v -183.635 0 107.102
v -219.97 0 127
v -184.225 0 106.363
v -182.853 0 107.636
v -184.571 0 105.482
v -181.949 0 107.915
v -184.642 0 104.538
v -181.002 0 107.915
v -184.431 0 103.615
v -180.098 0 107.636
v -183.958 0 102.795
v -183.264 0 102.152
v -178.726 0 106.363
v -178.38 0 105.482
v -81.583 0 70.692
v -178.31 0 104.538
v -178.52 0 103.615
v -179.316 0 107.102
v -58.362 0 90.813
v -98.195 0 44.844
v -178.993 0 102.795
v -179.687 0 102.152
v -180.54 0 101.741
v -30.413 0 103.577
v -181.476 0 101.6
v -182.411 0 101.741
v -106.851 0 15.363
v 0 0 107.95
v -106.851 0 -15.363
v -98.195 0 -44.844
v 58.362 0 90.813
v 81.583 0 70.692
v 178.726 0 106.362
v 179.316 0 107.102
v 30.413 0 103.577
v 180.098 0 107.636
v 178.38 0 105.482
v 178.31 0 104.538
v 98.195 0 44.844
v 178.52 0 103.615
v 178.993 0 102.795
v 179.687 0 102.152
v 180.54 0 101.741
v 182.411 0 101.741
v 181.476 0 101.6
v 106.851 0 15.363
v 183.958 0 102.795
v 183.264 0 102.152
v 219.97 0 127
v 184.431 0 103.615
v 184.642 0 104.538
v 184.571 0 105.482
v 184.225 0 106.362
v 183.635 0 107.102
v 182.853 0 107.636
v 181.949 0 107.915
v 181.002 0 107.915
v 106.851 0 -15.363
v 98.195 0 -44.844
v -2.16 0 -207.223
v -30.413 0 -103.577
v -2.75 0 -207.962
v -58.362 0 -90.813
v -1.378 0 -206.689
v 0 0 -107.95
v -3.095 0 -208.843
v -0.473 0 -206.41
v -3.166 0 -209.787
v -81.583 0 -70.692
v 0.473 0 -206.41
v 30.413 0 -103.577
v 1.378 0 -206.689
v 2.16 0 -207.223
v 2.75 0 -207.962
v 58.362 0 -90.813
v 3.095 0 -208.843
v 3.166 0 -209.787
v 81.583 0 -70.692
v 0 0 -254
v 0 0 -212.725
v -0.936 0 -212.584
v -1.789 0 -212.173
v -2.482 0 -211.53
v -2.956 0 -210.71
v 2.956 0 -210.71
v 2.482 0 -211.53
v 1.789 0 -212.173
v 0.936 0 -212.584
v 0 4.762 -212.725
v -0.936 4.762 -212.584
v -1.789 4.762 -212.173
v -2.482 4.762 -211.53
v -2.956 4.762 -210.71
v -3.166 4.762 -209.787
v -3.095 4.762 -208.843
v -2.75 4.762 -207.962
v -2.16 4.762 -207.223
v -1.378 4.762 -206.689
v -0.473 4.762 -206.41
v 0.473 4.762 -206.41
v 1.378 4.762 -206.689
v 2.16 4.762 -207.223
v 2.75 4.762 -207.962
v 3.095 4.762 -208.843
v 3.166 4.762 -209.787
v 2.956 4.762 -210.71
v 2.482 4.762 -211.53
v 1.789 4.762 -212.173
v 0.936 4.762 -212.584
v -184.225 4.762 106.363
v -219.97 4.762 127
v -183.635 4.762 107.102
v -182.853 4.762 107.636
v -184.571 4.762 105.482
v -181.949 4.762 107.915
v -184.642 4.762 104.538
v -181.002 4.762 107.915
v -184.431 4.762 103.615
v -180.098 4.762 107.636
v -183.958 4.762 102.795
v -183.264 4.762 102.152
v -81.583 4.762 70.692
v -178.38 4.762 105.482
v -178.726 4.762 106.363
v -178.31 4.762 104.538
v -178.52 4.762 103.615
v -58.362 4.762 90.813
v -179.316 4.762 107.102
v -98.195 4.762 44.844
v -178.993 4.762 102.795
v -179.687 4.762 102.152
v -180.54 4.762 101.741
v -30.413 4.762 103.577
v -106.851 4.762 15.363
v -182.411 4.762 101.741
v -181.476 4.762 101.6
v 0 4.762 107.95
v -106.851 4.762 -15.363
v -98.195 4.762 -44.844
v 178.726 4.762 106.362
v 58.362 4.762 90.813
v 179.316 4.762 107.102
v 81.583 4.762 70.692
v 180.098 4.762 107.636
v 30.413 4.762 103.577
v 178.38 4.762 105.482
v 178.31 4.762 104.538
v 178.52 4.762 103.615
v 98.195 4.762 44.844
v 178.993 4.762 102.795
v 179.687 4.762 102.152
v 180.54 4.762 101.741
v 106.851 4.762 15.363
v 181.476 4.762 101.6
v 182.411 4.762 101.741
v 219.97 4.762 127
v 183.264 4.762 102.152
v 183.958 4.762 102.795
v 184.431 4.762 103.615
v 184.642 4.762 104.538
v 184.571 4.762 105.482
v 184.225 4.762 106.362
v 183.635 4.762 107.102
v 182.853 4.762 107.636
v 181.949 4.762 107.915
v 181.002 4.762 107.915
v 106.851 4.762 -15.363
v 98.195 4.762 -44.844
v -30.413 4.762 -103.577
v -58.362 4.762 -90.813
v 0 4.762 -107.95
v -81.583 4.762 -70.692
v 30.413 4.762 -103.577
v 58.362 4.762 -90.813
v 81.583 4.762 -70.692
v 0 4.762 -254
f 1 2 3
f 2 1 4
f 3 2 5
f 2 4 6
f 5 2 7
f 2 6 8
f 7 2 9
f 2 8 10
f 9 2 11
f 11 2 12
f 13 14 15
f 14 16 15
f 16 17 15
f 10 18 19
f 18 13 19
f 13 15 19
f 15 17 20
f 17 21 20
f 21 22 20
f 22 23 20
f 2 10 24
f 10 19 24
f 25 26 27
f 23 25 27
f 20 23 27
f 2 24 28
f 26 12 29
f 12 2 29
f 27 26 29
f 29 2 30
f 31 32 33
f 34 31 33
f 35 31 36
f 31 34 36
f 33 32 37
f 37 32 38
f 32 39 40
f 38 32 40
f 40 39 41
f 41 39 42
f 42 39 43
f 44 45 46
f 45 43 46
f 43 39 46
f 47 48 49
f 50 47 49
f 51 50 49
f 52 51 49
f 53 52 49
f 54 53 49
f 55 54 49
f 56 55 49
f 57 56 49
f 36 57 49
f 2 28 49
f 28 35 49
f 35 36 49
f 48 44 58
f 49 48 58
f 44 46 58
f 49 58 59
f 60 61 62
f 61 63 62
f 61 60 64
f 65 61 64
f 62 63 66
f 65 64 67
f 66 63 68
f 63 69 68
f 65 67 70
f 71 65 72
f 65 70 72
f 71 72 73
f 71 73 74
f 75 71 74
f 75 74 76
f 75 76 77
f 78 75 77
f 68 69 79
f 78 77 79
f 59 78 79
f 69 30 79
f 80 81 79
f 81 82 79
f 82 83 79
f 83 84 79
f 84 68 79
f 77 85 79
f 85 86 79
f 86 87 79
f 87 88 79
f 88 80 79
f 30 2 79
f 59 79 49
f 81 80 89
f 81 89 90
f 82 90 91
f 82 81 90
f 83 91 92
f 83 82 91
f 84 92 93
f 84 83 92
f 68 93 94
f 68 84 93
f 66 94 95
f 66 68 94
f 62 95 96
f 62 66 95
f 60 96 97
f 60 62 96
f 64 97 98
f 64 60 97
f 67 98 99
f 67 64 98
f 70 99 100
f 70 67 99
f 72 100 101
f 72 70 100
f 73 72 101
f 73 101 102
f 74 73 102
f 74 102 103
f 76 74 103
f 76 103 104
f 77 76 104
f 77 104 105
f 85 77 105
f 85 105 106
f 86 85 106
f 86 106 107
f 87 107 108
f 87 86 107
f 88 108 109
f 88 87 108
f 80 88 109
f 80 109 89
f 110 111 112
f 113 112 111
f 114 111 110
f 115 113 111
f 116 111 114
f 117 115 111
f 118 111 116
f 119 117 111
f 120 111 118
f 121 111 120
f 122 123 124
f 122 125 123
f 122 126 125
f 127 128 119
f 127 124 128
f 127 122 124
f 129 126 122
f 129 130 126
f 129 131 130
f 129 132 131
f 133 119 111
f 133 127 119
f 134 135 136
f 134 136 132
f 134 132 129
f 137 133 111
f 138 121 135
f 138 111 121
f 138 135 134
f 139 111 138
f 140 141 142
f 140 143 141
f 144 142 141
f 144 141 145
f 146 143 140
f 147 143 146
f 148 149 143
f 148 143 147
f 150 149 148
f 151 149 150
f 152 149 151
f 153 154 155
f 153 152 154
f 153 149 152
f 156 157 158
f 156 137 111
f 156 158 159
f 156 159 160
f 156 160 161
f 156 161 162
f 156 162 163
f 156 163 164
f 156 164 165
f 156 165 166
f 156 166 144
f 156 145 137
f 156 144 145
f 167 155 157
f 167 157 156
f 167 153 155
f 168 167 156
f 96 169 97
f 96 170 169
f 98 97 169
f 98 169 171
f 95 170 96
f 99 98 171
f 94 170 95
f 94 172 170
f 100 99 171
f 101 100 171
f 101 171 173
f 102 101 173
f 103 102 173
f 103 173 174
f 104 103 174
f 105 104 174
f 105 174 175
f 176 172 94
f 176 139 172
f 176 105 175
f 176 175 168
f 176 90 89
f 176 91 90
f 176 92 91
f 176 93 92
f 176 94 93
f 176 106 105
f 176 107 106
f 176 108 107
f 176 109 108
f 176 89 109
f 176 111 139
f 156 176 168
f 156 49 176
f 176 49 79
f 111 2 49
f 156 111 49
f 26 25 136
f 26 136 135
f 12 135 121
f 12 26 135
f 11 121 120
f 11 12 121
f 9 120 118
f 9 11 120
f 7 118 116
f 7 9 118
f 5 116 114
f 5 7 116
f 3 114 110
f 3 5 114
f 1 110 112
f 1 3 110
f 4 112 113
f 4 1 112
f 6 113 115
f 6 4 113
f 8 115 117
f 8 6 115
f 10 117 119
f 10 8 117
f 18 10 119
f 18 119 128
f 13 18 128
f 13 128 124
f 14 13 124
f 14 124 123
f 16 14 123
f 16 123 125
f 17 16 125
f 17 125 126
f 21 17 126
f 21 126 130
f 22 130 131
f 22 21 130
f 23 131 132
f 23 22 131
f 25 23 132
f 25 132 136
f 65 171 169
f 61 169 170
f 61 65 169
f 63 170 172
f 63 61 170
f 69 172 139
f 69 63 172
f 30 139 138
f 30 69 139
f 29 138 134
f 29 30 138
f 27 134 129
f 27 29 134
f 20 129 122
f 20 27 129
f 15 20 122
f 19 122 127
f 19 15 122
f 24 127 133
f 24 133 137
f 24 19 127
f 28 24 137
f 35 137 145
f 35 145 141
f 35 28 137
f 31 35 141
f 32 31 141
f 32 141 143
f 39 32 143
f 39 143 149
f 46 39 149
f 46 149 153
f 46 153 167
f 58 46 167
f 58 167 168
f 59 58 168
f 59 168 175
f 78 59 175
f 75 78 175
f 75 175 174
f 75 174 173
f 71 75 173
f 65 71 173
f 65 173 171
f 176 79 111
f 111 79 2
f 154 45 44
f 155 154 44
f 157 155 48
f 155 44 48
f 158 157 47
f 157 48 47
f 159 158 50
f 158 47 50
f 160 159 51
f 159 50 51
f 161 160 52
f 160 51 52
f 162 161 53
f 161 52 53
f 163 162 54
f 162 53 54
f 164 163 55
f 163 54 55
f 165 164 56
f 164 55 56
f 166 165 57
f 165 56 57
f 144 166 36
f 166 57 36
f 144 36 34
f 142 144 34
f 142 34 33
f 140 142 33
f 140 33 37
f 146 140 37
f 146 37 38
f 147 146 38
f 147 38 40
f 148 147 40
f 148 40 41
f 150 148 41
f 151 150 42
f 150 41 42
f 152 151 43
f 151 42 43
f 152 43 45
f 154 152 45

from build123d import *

# Parameters (mm, degrees)
BOSS_EXTRUDE1_DEPTH     = 4.7625
CUT_EXTRUDE3_DEPTH      = 4.7625
CUT_EXTRUDE3_DEPTH_BACK = 4.7625
SKETCH5_R               = 107.95
SKETCH6_R               = 3.175
CUT_EXTRUDE5_DEPTH      = 4.7625


with BuildPart() as part:
    # Sketch1 → Boss-Extrude1 (new body)
    with BuildSketch(Plane(origin=(0, 0, 0), x_dir=(1, 0, 0), z_dir=(0, 1, 0))):
        Polygon((0, 254), (-219.970452561, -127), (219.970452561, -127), align=None)
    extrude(amount=BOSS_EXTRUDE1_DEPTH)

    # Sketch5 → Cut-Extrude3 (cut, two sides: drawn at the far end of the back side and taken through both)
    with BuildSketch(Plane(origin=(0, 0, 0), x_dir=(1, 0, 0), z_dir=(0, 1, 0)).offset(-CUT_EXTRUDE3_DEPTH_BACK)):
        Circle(SKETCH5_R)
    extrude(amount=CUT_EXTRUDE3_DEPTH + CUT_EXTRUDE3_DEPTH_BACK, mode=Mode.SUBTRACT)

    # Sketch6 → Cut-Extrude5 (cut)
    with BuildSketch(Plane(origin=(0, 0, 0), x_dir=(1, 0, 0), z_dir=(0, 1, 0))):
        with Locations((-181.475623363, -104.775)):
            Circle(SKETCH6_R)
        with Locations((0, 209.55)):
            Circle(SKETCH6_R)
    cut_extrude5 = extrude(amount=CUT_EXTRUDE5_DEPTH, mode=Mode.SUBTRACT)

    # Mirror1: Cut-Extrude5 across plane
    add(cut_extrude5.mirror(Plane(origin=(0, 0, 0), x_dir=(0, 0, 1), z_dir=(1, 0, 0))), mode=Mode.SUBTRACT)


solid = part.part
